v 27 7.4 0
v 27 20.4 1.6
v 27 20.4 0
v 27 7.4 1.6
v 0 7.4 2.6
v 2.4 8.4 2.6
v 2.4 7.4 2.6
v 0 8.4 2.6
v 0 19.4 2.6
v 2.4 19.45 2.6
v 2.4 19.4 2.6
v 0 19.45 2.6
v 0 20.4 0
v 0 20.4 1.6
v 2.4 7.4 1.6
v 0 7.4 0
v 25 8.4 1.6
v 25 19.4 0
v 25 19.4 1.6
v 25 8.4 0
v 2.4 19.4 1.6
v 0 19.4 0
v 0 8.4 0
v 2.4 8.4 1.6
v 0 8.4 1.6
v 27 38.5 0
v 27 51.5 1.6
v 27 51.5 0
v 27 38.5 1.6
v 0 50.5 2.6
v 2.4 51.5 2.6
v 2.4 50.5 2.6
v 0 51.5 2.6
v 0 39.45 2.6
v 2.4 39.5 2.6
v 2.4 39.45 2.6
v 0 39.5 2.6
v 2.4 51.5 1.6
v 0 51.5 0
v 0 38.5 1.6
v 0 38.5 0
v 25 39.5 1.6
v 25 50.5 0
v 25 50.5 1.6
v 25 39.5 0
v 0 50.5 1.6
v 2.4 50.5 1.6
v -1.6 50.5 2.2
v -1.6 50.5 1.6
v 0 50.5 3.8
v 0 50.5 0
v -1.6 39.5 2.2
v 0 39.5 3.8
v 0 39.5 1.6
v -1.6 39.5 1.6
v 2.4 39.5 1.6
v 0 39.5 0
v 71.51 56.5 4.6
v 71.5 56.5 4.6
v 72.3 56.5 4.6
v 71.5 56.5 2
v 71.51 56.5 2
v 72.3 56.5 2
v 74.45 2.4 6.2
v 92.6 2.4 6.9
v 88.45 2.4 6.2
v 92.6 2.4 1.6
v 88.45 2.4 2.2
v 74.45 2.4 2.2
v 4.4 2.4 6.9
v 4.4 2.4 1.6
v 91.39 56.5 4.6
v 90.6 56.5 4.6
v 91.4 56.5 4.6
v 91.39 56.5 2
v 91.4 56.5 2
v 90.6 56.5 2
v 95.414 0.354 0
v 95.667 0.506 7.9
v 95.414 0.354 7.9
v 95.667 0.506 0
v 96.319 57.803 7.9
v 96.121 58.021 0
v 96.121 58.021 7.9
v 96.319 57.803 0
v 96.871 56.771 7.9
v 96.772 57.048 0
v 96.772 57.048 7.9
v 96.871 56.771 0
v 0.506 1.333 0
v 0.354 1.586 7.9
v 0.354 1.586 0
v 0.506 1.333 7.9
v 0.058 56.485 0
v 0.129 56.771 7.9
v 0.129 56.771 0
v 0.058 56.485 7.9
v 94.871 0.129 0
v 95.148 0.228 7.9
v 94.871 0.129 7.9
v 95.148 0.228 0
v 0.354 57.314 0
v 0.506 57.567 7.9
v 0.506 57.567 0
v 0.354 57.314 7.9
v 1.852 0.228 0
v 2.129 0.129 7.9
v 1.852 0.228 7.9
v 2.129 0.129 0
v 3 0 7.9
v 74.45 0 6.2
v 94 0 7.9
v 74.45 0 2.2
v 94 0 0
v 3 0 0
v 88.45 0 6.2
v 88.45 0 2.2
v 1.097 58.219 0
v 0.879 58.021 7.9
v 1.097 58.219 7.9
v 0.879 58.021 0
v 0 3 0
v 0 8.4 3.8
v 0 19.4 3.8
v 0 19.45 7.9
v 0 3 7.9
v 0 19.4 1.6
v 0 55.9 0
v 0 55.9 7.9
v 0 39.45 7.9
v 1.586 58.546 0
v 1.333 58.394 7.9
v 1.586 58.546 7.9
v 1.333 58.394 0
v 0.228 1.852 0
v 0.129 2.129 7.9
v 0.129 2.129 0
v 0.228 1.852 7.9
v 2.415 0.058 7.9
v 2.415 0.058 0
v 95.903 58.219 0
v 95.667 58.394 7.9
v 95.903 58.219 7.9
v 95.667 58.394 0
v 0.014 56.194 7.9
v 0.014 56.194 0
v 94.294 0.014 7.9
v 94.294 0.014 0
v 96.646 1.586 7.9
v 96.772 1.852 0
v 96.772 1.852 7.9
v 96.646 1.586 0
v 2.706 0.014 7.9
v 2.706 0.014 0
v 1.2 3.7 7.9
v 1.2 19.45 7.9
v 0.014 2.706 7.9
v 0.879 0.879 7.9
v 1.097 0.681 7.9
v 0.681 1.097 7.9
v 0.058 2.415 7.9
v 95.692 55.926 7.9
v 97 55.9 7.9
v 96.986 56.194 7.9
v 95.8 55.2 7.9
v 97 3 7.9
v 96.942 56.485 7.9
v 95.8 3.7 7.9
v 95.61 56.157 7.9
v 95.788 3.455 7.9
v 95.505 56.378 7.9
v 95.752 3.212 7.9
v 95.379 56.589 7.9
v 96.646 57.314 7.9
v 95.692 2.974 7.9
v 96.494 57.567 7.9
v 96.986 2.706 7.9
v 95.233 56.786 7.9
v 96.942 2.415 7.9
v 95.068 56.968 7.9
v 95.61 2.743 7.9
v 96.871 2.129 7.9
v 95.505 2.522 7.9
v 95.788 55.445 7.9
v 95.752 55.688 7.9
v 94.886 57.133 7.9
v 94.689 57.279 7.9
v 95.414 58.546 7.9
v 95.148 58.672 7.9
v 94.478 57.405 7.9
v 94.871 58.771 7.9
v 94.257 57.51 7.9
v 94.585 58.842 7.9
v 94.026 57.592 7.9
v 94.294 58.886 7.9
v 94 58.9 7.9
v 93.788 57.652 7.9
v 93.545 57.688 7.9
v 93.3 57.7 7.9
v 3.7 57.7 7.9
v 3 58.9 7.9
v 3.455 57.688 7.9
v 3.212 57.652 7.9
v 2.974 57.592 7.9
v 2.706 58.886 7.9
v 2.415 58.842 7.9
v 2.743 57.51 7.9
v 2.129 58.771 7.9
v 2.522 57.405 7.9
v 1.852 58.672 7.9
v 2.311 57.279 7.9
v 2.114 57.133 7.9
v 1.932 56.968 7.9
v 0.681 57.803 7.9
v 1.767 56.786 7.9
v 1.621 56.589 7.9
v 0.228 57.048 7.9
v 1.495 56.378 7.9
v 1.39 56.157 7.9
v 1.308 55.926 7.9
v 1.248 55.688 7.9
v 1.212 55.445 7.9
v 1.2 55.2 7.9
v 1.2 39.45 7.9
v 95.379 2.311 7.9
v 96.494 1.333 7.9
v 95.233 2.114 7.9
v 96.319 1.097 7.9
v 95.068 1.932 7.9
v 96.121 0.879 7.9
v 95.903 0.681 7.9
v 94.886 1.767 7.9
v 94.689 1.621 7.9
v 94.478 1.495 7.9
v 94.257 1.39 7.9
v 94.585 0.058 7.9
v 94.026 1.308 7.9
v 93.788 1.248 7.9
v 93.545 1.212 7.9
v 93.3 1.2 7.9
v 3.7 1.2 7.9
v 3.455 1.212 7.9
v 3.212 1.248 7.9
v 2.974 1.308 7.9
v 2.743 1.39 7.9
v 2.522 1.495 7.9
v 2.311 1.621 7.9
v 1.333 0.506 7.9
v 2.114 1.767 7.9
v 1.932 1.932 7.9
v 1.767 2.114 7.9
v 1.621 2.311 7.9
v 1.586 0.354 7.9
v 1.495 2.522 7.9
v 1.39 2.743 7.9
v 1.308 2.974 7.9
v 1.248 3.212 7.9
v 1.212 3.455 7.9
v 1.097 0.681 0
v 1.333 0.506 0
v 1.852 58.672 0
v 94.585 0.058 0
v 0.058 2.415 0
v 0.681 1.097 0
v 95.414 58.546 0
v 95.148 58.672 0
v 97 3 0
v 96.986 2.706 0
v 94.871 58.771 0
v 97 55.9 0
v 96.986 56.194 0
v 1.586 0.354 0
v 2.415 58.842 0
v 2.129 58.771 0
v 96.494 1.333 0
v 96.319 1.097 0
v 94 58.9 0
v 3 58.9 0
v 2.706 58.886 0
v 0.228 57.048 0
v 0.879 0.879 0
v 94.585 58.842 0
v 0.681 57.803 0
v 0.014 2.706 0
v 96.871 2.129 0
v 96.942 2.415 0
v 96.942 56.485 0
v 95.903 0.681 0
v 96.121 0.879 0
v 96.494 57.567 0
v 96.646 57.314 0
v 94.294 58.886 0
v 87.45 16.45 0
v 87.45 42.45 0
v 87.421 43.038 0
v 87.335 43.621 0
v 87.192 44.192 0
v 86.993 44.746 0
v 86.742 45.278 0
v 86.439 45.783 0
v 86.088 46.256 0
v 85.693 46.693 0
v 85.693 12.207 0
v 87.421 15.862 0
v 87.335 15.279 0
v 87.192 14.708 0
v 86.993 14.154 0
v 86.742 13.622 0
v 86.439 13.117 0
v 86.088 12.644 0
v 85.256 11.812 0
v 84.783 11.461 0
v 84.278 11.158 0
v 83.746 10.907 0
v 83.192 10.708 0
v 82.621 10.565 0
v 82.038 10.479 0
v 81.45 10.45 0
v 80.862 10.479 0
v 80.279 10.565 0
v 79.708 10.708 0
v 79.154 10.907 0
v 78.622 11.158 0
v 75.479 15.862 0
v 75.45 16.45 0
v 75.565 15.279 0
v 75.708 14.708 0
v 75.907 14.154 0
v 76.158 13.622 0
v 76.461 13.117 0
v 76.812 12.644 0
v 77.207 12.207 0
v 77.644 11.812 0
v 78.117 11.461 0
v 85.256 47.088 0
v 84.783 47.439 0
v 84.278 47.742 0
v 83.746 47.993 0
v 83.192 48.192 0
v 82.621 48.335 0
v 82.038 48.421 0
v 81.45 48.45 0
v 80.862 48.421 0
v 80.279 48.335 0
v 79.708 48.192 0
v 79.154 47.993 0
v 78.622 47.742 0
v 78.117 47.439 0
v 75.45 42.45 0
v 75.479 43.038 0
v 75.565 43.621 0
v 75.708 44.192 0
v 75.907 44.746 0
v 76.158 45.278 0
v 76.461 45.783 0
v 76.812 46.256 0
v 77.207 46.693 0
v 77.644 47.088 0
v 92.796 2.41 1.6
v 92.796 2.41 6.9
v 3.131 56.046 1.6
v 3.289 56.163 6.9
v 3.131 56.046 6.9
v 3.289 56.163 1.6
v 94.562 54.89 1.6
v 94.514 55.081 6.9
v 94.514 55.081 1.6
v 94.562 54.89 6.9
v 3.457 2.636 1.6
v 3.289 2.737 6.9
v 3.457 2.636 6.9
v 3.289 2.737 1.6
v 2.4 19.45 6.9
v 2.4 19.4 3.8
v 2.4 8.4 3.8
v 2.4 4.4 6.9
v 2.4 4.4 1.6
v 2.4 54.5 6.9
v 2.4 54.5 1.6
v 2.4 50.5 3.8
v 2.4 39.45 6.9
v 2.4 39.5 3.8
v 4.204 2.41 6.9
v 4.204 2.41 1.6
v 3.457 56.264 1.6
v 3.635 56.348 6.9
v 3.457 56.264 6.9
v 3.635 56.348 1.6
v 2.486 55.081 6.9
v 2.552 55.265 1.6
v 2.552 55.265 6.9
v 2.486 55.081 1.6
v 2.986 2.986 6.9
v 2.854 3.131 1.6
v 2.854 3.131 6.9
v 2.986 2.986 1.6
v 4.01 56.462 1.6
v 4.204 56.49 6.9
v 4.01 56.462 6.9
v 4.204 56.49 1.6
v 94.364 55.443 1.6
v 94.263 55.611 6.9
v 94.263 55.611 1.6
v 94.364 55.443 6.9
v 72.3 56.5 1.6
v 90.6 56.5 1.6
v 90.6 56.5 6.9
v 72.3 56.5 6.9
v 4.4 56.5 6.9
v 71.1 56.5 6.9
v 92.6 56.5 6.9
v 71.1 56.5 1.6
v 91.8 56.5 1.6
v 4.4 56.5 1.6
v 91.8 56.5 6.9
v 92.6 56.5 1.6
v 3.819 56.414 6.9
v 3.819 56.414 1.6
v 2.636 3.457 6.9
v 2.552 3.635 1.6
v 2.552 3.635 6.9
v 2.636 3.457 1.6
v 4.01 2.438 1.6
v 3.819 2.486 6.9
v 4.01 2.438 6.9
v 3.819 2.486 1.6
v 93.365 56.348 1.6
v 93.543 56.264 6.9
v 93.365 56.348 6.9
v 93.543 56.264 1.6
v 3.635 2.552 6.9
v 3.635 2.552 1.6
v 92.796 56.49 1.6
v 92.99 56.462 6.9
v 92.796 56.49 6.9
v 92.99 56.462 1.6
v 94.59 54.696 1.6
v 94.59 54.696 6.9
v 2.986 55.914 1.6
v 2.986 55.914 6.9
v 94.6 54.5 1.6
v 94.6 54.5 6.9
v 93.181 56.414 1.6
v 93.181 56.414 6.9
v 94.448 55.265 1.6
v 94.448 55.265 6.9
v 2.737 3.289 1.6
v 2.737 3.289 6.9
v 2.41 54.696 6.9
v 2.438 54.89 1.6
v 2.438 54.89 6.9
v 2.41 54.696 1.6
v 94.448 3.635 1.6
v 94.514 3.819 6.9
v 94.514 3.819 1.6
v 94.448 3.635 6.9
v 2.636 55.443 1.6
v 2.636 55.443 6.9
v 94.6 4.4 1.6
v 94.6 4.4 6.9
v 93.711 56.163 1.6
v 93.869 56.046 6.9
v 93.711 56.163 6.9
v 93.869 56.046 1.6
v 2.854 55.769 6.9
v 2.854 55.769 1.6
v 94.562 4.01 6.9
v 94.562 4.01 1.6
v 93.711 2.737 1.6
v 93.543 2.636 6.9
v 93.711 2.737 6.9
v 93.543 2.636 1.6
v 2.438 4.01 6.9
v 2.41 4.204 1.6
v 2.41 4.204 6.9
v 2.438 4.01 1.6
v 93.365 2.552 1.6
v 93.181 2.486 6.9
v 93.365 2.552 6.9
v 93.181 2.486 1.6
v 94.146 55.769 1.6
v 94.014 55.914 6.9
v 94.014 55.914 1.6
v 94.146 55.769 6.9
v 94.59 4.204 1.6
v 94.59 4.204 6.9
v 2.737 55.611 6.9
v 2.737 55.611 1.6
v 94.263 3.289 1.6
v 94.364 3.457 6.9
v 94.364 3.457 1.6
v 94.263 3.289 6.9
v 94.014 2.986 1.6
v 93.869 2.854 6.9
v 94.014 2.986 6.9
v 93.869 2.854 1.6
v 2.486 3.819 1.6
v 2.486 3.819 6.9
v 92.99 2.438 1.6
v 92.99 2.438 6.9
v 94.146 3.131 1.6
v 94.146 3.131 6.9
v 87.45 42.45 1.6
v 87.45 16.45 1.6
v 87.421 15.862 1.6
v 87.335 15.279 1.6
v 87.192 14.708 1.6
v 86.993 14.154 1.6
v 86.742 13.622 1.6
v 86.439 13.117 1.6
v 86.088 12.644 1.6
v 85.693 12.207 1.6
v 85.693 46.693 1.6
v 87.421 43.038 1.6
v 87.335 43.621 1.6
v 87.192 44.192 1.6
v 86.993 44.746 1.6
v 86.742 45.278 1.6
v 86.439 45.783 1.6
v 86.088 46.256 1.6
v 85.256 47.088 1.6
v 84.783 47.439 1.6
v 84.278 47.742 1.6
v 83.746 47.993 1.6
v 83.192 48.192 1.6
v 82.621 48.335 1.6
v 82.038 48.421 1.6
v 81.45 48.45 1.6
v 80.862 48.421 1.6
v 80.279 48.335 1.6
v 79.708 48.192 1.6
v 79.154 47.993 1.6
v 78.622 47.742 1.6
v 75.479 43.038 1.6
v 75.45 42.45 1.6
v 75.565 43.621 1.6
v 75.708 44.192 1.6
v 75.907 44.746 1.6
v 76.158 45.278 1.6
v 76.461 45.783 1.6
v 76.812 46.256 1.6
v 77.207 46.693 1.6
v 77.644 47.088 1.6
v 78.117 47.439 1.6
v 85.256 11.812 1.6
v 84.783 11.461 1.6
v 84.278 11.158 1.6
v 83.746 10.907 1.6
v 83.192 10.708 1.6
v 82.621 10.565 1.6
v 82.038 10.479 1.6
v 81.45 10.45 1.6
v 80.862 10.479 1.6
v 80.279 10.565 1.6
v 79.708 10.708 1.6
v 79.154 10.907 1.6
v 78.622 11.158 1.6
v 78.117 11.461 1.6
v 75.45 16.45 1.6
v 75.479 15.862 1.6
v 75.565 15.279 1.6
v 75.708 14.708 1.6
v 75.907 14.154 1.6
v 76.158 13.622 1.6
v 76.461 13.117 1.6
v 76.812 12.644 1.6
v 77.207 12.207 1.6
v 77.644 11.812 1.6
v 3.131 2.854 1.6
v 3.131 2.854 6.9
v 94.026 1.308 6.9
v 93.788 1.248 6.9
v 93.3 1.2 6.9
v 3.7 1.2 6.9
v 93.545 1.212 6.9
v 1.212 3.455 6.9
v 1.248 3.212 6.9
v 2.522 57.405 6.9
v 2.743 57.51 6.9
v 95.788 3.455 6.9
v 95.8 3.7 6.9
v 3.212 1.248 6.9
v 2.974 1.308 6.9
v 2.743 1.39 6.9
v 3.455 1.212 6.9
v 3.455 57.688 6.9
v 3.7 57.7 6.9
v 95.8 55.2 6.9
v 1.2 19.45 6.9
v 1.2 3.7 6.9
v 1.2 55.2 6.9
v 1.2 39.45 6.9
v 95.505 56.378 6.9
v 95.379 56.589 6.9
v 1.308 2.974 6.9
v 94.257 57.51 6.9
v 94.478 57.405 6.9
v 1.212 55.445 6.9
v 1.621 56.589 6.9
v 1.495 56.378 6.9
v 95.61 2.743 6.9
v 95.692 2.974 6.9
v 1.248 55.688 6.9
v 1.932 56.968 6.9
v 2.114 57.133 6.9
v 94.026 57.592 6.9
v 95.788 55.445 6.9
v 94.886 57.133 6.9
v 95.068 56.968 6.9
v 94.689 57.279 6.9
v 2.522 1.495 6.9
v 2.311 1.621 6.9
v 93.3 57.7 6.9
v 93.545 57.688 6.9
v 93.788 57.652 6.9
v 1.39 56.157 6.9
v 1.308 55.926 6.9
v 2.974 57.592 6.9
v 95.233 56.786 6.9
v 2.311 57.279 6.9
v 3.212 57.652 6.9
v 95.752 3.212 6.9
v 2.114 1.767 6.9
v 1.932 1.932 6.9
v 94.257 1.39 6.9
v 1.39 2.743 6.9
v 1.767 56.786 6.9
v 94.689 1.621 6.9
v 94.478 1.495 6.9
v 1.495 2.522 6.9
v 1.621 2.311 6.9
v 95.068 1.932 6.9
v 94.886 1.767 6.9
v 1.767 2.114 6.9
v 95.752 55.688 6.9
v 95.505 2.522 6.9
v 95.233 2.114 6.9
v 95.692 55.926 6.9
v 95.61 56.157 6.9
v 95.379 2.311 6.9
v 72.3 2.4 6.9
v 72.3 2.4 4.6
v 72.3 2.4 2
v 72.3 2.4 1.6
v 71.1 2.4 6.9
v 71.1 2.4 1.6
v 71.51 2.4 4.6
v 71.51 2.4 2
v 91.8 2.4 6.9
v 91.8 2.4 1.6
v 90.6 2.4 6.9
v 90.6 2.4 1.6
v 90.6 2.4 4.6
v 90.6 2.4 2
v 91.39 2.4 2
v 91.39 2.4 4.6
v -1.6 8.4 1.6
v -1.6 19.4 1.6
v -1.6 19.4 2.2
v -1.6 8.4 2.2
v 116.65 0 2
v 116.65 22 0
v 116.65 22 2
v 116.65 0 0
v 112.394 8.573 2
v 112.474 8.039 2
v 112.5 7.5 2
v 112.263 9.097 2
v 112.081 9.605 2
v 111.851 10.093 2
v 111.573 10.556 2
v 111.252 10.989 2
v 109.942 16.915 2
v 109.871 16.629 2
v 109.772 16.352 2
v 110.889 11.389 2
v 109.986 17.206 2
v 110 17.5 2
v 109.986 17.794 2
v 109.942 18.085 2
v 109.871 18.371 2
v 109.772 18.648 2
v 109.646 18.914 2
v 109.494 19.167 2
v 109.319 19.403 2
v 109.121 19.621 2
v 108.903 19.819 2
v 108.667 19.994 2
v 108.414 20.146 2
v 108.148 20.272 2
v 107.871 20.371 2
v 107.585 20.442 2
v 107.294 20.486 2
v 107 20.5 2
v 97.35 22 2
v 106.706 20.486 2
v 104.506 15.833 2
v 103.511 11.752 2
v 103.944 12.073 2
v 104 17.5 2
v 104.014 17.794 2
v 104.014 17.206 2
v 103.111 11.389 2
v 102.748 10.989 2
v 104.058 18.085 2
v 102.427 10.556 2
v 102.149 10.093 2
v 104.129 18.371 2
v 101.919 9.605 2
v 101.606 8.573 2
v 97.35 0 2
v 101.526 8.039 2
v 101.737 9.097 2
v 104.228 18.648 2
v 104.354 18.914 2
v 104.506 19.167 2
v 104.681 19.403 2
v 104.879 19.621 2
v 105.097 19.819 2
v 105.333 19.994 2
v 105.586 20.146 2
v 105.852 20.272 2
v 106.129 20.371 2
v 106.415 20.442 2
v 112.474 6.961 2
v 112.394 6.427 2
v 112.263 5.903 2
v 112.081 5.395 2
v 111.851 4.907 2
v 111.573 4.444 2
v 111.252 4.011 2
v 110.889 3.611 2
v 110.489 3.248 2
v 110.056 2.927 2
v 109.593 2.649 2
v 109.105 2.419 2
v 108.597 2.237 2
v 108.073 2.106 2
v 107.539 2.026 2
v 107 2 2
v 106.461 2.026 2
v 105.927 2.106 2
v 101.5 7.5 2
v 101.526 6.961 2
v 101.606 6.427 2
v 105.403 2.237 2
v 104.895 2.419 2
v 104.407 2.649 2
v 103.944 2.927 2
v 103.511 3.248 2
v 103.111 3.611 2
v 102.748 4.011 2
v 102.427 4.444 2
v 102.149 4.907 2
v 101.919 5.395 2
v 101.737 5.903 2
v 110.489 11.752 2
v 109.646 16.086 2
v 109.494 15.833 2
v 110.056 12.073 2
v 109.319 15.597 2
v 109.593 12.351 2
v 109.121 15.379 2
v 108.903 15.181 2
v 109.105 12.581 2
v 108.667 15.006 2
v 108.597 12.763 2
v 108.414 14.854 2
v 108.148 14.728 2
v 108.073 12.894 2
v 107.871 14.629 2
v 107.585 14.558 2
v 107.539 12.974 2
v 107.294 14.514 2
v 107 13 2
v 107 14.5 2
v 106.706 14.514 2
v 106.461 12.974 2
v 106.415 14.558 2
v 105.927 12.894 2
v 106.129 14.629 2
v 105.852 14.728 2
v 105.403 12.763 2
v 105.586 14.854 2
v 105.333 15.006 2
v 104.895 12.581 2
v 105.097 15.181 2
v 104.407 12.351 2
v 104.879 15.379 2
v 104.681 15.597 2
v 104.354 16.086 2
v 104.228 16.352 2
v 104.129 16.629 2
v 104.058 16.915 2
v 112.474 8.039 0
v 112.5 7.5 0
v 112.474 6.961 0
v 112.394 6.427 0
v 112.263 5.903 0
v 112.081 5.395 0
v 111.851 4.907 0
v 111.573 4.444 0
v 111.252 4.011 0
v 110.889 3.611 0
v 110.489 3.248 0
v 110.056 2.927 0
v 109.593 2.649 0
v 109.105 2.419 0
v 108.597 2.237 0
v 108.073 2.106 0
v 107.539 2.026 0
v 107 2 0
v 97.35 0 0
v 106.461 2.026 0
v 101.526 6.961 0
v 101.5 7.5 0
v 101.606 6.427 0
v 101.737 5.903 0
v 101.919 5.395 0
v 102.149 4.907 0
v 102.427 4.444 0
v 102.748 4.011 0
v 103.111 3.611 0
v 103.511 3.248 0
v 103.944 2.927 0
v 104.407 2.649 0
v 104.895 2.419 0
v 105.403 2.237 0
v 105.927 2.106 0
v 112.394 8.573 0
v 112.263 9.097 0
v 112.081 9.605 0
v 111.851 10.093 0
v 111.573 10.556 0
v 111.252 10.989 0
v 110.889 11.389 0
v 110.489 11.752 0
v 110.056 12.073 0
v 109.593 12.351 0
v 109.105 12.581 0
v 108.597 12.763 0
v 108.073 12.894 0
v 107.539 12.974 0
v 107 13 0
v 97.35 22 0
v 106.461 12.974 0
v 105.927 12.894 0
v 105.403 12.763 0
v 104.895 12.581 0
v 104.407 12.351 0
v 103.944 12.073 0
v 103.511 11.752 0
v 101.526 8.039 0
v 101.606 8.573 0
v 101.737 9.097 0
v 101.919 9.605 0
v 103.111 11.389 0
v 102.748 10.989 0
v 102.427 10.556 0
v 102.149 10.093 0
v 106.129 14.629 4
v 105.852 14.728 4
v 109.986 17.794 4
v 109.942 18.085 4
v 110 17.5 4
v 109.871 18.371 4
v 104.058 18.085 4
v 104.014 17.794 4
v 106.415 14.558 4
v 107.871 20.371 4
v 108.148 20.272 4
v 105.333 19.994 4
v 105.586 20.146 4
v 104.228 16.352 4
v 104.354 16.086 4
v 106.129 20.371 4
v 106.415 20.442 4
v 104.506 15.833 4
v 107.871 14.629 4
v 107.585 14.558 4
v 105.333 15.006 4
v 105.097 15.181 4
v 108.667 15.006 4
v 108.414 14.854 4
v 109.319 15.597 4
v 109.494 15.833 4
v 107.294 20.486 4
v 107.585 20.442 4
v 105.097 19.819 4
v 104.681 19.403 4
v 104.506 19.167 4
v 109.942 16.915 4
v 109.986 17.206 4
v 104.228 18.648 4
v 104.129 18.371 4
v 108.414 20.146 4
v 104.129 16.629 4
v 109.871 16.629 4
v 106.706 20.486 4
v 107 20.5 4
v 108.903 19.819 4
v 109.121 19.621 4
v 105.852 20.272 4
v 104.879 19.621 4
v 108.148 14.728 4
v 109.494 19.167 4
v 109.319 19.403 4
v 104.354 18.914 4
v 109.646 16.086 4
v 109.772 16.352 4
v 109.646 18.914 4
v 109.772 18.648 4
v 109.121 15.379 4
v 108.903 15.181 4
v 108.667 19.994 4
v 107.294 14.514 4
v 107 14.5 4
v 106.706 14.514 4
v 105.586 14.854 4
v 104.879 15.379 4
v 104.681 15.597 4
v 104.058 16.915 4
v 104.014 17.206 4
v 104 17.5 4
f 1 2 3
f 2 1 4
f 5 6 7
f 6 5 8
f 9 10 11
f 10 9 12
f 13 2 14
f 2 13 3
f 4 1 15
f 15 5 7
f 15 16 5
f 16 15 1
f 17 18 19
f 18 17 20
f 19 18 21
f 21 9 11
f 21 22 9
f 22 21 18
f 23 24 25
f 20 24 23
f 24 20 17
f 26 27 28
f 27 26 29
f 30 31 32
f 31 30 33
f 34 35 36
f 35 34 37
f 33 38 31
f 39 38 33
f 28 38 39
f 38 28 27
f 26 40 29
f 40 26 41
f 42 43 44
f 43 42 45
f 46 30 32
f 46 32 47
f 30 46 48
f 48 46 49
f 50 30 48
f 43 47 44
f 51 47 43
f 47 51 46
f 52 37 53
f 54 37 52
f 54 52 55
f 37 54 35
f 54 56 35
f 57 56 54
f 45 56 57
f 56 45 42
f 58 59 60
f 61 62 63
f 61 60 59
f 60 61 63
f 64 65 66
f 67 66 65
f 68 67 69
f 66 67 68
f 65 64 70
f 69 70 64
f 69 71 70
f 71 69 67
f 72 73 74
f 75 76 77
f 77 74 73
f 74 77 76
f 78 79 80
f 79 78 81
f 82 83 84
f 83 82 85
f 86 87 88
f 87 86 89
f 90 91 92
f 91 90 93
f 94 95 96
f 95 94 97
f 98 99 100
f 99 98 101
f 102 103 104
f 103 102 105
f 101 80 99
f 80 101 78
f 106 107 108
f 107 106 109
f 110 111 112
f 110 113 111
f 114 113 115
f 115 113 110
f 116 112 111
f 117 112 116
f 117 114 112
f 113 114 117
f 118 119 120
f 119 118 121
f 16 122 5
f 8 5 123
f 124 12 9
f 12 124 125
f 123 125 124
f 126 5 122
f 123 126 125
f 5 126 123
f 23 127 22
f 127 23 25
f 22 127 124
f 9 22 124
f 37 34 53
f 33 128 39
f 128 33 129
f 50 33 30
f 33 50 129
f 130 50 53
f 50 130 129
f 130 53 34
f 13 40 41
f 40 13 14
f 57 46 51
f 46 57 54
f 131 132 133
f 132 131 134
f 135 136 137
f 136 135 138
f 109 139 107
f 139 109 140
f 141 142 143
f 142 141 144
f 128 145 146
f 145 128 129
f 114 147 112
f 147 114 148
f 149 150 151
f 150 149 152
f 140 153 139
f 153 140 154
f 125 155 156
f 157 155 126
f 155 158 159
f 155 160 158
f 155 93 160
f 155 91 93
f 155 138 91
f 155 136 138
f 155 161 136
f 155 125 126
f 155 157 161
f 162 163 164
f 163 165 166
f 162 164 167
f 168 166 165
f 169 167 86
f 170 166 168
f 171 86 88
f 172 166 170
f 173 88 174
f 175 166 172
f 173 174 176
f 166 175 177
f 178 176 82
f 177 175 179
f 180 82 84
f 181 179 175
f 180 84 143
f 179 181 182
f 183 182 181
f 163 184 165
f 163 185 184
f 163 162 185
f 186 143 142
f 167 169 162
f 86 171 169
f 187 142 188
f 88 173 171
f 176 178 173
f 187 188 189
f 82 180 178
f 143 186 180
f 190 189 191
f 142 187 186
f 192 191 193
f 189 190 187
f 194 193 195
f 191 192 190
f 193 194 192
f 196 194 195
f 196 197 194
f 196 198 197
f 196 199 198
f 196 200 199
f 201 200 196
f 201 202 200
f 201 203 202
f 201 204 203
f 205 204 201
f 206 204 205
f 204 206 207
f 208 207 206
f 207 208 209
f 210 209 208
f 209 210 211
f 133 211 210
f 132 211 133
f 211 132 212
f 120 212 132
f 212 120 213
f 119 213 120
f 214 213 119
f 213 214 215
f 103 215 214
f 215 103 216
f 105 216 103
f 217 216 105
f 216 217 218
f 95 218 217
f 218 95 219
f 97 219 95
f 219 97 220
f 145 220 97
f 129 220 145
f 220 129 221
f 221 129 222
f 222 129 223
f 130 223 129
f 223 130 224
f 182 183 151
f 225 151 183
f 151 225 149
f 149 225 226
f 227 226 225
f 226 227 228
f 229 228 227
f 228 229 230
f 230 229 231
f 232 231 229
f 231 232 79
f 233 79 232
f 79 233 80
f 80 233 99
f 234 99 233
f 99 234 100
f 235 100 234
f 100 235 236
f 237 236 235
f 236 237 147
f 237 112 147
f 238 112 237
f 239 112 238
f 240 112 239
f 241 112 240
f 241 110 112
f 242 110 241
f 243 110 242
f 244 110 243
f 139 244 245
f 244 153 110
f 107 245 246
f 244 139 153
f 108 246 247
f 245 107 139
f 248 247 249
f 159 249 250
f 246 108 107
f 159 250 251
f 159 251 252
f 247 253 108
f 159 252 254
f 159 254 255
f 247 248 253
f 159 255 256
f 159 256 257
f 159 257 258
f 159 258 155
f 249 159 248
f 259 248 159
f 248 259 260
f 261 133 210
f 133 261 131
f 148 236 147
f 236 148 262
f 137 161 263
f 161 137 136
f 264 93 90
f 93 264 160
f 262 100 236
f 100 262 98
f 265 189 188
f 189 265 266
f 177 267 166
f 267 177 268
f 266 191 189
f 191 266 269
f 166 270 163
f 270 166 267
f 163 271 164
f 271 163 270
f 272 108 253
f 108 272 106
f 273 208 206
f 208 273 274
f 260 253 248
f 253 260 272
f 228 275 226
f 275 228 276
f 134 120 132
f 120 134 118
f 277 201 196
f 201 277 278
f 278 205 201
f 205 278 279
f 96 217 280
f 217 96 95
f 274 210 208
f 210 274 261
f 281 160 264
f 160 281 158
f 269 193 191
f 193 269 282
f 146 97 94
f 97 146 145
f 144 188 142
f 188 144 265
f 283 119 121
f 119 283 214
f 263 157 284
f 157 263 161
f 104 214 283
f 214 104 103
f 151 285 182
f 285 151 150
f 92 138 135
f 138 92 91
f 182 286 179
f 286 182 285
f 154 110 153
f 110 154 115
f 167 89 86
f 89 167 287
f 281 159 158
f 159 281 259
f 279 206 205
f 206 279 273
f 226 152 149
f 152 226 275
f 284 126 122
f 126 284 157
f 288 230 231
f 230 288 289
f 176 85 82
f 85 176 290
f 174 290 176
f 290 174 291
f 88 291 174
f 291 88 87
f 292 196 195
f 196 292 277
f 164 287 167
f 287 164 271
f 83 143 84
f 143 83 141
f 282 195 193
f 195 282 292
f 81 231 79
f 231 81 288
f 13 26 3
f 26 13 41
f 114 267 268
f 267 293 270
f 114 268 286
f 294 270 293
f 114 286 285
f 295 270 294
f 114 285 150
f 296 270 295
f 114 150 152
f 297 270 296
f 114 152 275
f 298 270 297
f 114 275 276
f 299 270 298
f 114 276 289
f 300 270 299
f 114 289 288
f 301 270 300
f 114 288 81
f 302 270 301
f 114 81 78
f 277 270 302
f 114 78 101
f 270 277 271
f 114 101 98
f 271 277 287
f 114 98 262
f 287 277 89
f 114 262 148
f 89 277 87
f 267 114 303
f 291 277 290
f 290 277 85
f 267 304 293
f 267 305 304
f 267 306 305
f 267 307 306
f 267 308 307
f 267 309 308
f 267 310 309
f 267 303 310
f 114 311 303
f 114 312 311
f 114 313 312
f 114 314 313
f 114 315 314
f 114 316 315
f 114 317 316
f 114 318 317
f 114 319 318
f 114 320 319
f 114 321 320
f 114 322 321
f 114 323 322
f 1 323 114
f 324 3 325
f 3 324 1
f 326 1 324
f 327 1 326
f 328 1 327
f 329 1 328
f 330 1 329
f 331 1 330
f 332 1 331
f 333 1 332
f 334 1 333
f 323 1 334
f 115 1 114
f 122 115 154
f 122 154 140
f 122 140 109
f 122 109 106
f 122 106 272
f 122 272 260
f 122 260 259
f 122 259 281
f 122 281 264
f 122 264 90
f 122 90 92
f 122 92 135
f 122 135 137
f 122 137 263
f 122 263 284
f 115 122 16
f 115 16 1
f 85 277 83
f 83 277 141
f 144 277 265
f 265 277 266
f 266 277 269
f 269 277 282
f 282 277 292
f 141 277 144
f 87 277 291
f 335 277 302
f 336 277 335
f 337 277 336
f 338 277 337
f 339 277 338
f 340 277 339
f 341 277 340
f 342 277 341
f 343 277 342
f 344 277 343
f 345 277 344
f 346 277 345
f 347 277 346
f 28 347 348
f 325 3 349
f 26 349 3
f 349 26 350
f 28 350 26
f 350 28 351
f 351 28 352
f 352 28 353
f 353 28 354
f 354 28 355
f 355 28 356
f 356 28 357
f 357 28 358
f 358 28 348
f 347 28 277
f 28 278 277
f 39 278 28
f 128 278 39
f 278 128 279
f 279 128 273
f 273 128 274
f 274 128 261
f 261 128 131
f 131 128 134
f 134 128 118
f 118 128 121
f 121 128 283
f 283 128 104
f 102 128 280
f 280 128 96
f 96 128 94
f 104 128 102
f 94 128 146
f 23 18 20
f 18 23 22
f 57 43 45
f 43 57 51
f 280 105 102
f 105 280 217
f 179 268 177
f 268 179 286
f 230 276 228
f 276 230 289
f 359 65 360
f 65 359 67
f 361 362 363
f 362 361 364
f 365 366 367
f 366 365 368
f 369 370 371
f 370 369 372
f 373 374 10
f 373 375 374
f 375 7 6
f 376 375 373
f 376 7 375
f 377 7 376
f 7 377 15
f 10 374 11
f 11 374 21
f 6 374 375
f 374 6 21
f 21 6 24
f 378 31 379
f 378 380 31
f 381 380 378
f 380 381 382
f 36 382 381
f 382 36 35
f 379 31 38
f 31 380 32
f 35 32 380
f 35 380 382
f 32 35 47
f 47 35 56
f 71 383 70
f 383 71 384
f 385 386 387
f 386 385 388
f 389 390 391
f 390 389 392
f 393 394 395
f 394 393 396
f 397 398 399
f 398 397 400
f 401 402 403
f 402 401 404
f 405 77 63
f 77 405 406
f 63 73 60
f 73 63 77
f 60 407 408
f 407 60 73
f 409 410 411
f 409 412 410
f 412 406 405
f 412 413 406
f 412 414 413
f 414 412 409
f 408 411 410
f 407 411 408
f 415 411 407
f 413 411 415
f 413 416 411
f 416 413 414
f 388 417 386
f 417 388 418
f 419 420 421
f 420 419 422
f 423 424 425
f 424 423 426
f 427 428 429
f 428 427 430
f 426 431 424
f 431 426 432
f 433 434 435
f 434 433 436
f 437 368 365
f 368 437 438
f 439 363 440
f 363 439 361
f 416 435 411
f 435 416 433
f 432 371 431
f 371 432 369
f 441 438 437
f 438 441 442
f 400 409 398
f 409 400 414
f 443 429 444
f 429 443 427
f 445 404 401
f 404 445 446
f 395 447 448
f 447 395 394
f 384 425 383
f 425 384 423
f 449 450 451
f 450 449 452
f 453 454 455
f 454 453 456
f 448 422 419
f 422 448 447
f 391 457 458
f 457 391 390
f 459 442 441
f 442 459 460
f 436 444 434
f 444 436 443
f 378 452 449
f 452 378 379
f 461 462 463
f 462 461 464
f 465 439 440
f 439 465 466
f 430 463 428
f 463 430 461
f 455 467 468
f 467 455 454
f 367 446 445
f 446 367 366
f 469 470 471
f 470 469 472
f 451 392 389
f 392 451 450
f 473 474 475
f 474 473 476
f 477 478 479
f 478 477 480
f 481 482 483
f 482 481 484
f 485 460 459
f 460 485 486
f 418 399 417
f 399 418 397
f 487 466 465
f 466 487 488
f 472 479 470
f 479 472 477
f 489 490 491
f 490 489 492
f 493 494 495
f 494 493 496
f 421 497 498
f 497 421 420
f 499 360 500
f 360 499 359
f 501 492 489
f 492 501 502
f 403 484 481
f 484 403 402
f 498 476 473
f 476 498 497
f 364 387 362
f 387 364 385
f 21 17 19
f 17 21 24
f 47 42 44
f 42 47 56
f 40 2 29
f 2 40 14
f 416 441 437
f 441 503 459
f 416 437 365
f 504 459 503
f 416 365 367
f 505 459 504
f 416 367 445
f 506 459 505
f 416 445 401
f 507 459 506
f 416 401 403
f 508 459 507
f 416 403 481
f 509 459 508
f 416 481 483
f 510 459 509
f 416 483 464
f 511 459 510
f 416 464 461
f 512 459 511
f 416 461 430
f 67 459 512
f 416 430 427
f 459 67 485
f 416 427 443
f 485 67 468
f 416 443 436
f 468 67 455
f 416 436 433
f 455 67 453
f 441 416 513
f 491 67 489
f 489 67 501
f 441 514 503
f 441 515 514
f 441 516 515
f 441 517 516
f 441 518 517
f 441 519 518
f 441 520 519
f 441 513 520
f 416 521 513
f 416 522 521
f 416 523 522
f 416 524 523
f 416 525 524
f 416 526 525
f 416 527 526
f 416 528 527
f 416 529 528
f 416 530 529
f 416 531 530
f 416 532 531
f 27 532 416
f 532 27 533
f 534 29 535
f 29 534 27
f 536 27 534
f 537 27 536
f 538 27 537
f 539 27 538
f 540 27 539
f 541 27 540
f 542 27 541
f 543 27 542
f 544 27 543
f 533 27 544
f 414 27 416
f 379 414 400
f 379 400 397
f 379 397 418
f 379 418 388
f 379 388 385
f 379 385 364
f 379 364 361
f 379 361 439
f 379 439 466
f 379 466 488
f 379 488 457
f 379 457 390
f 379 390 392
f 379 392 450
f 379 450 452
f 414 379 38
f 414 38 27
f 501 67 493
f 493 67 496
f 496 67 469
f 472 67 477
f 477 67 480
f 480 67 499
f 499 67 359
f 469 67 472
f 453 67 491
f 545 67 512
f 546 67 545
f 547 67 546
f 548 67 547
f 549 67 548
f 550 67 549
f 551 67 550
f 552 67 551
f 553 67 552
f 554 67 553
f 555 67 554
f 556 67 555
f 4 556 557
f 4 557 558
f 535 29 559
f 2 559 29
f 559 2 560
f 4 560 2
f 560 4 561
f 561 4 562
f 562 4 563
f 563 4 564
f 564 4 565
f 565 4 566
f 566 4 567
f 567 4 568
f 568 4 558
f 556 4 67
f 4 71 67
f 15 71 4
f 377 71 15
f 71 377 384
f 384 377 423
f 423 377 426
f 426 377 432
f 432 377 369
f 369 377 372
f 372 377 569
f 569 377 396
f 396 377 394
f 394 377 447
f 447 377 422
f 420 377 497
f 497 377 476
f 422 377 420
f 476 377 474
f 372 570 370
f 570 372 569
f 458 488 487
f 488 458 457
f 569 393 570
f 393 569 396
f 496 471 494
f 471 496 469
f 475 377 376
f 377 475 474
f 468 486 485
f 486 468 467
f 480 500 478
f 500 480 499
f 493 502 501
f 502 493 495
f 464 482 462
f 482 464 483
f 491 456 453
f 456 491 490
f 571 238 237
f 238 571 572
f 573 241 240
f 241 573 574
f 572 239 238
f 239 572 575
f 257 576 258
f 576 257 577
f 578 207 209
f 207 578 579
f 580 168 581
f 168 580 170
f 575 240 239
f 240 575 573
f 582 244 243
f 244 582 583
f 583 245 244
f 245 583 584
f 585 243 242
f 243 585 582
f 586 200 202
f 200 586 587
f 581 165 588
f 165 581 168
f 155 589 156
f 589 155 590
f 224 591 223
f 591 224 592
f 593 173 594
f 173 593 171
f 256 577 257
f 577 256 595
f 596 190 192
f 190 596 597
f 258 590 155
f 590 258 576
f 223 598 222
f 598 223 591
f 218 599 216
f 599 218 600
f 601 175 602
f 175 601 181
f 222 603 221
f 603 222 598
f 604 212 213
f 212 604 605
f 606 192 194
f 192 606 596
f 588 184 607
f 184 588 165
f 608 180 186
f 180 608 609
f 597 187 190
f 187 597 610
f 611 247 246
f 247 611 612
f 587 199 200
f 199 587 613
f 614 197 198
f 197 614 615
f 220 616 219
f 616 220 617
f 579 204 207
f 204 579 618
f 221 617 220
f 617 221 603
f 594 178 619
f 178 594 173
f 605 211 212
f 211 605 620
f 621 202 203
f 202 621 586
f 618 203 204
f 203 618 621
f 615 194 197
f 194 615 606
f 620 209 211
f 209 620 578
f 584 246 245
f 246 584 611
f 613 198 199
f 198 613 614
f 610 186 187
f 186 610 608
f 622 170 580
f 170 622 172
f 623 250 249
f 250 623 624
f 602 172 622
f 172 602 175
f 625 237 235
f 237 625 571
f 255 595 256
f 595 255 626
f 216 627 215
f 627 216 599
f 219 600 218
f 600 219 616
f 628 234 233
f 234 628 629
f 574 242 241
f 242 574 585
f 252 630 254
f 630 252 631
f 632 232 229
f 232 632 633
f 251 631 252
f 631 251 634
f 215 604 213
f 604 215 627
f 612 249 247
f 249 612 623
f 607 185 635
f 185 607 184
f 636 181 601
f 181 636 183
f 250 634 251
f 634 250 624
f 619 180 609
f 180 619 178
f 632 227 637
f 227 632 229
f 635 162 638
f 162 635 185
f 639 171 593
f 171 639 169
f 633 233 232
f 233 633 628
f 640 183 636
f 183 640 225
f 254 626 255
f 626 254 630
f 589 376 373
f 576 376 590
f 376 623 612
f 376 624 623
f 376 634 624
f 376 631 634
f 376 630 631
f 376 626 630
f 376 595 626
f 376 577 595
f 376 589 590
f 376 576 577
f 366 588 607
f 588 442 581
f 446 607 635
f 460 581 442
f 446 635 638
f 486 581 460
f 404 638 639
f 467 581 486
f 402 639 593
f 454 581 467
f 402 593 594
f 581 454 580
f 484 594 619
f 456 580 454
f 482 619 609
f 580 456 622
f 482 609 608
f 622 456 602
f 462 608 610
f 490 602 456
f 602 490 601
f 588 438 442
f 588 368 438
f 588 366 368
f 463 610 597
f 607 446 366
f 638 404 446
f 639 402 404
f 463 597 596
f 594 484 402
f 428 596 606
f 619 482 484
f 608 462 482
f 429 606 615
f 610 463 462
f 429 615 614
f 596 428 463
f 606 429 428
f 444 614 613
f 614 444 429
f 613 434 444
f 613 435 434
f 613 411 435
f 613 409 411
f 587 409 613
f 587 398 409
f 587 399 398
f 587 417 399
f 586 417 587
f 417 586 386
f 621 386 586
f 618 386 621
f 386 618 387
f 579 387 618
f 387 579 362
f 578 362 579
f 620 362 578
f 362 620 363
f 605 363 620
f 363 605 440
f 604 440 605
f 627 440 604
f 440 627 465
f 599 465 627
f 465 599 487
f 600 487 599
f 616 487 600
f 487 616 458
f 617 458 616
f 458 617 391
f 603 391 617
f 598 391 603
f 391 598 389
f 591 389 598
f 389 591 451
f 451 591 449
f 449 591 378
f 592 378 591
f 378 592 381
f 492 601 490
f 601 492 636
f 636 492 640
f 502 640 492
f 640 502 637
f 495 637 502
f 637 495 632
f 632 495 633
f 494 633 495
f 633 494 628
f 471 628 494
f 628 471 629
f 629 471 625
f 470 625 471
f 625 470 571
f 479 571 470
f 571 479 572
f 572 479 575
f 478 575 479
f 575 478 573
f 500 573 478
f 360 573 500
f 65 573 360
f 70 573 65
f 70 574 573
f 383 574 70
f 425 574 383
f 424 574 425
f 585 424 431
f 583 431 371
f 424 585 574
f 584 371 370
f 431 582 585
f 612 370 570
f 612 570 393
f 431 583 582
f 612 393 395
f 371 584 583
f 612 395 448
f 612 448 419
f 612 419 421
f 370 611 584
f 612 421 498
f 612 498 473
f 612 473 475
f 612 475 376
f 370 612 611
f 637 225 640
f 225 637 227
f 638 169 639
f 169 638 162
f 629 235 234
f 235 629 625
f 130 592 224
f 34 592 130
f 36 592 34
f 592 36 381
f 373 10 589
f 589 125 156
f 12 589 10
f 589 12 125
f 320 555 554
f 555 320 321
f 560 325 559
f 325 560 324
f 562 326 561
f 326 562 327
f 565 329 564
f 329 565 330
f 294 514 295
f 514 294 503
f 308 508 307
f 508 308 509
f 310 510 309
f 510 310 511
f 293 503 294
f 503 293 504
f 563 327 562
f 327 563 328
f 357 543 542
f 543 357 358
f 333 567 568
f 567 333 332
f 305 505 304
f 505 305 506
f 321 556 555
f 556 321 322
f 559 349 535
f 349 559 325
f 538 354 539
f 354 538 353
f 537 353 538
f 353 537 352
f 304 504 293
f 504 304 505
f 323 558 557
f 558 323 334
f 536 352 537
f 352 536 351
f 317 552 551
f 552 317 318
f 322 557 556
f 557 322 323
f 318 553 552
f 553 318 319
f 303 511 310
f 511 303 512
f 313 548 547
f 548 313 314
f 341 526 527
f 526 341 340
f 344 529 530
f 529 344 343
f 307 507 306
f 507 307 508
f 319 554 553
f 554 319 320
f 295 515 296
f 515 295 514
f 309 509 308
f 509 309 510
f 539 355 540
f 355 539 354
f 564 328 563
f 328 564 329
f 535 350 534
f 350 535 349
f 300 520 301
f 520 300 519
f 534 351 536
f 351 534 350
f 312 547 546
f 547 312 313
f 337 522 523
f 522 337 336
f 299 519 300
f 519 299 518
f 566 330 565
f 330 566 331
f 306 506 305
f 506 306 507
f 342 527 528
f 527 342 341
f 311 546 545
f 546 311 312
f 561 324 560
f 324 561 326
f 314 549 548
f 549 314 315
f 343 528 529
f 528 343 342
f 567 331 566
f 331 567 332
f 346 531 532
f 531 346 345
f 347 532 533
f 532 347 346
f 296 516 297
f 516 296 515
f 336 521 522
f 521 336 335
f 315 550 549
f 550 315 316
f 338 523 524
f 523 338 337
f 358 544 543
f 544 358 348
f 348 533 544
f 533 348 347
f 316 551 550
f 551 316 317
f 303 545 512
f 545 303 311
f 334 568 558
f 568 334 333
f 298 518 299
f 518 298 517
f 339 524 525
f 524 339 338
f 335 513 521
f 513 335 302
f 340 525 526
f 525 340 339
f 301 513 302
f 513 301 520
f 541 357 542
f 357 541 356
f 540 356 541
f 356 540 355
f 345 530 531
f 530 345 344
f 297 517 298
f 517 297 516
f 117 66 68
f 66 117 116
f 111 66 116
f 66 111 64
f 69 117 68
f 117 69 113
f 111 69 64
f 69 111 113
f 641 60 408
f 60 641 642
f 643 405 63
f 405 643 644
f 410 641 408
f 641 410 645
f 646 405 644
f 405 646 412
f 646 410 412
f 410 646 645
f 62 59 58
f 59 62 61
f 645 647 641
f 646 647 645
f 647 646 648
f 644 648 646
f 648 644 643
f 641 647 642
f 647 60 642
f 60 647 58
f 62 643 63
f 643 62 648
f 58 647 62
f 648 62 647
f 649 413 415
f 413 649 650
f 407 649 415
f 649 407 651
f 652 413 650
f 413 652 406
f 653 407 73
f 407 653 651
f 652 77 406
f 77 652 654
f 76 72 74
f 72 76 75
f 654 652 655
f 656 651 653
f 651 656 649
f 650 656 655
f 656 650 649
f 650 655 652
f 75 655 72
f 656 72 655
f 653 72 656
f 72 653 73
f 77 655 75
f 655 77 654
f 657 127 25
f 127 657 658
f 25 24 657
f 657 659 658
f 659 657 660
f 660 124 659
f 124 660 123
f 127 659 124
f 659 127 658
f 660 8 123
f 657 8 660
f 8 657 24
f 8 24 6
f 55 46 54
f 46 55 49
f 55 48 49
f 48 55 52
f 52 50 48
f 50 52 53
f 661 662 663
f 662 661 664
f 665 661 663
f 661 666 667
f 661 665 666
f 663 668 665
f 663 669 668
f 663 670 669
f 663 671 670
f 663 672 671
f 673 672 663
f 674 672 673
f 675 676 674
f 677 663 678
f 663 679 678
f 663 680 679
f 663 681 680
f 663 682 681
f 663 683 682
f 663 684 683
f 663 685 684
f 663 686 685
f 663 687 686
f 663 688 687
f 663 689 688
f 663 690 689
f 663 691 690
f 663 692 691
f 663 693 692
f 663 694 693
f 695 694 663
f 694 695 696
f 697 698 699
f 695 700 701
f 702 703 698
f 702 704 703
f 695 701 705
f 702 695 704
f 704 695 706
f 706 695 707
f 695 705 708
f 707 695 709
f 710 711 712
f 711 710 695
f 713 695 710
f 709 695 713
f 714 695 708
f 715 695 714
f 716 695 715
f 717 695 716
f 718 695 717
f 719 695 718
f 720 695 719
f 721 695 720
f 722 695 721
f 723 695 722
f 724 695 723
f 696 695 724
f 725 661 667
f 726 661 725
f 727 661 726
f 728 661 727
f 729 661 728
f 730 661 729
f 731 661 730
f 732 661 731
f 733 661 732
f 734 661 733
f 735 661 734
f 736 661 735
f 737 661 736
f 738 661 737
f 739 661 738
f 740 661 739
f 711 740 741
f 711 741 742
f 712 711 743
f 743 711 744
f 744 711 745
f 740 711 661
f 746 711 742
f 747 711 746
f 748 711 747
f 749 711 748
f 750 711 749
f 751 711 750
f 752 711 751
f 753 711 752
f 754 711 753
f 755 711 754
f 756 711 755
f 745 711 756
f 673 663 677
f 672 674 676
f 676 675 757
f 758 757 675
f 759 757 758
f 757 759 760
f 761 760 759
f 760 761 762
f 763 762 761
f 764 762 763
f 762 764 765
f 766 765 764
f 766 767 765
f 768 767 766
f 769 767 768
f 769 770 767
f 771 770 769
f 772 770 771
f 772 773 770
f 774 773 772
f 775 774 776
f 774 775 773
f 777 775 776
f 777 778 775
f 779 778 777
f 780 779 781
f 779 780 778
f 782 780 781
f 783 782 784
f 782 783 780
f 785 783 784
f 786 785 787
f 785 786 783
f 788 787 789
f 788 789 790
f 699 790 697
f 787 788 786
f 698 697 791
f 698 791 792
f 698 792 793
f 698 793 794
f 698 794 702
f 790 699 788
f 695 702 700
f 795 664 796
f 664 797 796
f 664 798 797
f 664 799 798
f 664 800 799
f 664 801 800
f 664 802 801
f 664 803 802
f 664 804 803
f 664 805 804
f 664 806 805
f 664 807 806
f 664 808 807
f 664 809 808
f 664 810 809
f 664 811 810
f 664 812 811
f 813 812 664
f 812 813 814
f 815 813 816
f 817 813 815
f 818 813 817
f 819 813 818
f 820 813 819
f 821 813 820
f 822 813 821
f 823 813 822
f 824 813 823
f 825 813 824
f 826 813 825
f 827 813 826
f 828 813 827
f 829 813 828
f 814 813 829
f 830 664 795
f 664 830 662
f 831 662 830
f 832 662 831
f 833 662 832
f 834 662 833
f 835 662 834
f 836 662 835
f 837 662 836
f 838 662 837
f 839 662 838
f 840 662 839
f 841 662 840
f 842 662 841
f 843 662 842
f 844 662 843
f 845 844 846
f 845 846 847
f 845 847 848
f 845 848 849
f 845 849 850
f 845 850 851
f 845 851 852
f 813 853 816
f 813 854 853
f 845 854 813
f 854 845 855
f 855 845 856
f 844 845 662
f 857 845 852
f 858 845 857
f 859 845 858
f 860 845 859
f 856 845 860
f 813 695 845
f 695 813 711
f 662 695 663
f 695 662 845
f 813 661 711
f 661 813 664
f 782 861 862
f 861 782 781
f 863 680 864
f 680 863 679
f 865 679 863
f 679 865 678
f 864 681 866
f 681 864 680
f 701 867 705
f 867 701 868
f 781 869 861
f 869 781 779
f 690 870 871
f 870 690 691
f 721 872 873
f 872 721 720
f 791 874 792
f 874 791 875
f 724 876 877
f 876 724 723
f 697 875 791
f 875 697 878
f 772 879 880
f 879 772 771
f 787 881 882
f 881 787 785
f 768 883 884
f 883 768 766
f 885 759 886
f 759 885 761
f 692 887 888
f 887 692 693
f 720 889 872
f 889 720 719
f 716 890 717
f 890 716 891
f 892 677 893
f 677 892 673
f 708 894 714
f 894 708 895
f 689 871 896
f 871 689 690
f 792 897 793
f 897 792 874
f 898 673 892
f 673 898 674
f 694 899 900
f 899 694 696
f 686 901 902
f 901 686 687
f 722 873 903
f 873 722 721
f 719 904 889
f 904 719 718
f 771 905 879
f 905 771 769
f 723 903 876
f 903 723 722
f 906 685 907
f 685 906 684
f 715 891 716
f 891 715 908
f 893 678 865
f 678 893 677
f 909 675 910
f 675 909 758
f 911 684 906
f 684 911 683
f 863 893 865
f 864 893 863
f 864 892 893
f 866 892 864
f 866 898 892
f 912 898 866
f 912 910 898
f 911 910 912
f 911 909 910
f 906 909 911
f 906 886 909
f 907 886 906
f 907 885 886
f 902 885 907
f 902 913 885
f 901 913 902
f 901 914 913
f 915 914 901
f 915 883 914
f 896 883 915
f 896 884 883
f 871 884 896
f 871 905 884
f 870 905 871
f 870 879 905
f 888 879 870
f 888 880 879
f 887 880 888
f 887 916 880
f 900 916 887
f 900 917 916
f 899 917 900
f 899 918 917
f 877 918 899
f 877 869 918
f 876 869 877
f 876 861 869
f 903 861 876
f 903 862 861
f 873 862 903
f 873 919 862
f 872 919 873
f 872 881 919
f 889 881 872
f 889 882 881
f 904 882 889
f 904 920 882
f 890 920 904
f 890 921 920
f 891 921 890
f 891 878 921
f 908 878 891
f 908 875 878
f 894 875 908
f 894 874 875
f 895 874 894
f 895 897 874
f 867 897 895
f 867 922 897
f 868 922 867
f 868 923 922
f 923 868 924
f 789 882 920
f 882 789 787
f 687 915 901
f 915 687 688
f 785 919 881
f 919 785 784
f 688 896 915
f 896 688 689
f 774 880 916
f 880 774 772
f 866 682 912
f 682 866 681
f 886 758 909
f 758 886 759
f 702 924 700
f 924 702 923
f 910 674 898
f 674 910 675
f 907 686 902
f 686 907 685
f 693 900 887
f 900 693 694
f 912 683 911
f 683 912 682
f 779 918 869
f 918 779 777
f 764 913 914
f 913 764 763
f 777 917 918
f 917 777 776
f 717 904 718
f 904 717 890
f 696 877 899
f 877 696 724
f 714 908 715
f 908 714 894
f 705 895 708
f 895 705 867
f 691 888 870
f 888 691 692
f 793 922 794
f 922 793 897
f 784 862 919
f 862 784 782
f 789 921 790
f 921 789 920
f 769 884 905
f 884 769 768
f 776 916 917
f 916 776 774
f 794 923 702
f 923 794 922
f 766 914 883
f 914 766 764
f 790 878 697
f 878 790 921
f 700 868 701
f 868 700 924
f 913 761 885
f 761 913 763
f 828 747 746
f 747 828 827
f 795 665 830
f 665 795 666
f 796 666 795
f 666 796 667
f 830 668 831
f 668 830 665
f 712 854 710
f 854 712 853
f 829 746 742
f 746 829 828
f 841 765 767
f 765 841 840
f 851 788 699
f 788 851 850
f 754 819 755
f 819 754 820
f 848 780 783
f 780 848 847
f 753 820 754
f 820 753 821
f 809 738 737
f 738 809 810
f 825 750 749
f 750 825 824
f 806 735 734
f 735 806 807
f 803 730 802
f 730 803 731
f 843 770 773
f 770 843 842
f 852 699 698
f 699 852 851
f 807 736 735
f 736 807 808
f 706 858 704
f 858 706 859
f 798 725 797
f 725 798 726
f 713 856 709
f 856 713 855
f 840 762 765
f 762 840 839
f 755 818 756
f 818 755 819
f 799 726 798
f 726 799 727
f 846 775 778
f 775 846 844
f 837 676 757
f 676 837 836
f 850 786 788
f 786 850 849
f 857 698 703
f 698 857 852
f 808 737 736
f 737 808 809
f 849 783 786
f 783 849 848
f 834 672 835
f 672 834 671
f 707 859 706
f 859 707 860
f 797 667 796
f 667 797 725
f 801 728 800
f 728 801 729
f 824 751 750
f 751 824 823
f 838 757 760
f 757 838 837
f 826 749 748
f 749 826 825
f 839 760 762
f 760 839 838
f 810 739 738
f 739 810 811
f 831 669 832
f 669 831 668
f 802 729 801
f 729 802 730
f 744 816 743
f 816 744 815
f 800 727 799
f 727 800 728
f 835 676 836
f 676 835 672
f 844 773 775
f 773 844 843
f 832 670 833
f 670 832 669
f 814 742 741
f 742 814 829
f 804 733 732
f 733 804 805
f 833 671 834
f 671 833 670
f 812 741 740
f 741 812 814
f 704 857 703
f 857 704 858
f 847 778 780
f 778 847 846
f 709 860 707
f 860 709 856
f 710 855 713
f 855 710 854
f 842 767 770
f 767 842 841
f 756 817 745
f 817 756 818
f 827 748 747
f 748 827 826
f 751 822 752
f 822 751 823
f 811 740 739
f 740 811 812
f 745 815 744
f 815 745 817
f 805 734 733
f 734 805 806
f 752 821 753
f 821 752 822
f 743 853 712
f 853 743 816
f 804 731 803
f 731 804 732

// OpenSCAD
// Recreated clip-in tray with cross slider
// Dimensions from caliper photos (inches -> mm):
//   overall length 3.82 in = 97.0   | width 2.32 in = 58.9
//   thickness      0.31 in =  7.9   | slider channel 0.72 in = 18.3
//   pocket length  3.63 in = 92.2 (approx, inner)
// Everything else is estimated from the photos - tweak below.

/* [Render] */
part = "all";          // [all, base, slider]

/* [Body] */
L        = 97.0;
W        = 58.9;
H        = 7.9;
corner_r = 3.0;
floor_t  = 1.6;
wall_t   = 2.4;
rim_w    = 1.2;   // stepped inner rim at the top edge
rim_d    = 1.0;

/* [Clip end (x = 0)] */
finger_w     = 11.0;
finger_len   = 26.0;
finger_gap   = 1.0;   // slot width around each finger
finger_inset = 6.0;   // distance from side wall to finger
hook_out     = 1.6;   // how far the hook sticks out past the end
hook_h       = 2.2;
end_gap_w    = 20.0;  // open notch in the end wall between fingers

/* [Slider channel (near x = L)] */
ch_w        = 18.3;   // measured
ch_x        = L - wall_t - 4.0 - ch_w/2;   // channel centre line
ch_wall     = 1.2;
groove_d    = 0.8;    // retention groove the slider rides in
slot_w      = 12.0;   // stadium window through the floor
slot_len    = 38.0;
side_win_h  = 4.0;    // window in the side wall the slider pokes out of
side_win_w  = 14.0;

/* [Slider] */
clr        = 0.3;     // fit clearance per side
sl_len     = 22.0;
sl_t       = 2.0;
hole_d     = 11.0;    // round hole / magnet seat
knob_d     = 6.0;
knob_h     = 2.0;

$fn = 64;

module rrect(x, y, h, r) {
    linear_extrude(h)
        offset(r) offset(-r) square([x, y]);
}

module stadium(len, w, h) {
    hull() {
        translate([0, w/2, 0])       cylinder(d = w, h = h);
        translate([0, len - w/2, 0]) cylinder(d = w, h = h);
    }
}

module base() {
    difference() {
        rrect(L, W, H, corner_r);

        // main pocket
        translate([wall_t, wall_t, floor_t])
            rrect(L - 2*wall_t, W - 2*wall_t, H, corner_r - 1);

        // stepped top rim
        translate([wall_t - rim_w, wall_t - rim_w, H - rim_d])
            rrect(L - 2*(wall_t - rim_w), W - 2*(wall_t - rim_w), H, corner_r - 0.5);

        // finger slots (U-cut around each finger)
        for (y0 = [finger_inset + wall_t, W - wall_t - finger_inset - finger_w])
            translate([-1, y0 - finger_gap, -1])
                difference() {
                    cube([finger_len + finger_gap + 1, finger_w + 2*finger_gap, floor_t + 2]);
                    translate([-1, finger_gap, -1])
                        cube([finger_len + 1, finger_w, floor_t + 4]);
                }

        // notch in end wall between fingers
        translate([-1, (W - end_gap_w)/2, floor_t])
            cube([wall_t + 2, end_gap_w, H]);

        // floor stadium window under the slider
        translate([ch_x, (W - slot_len)/2, -1])
            stadium(slot_len, slot_w, floor_t + 2);

        // side-wall window where the slider exits
        translate([ch_x - side_win_w/2, -1, floor_t + 0.6])
            cube([side_win_w, wall_t + 2, side_win_h]);

        // retention grooves inside the channel walls
        for (s = [-1, 1])
            translate([ch_x + s*(ch_w/2) - (s > 0 ? 0 : groove_d), wall_t, floor_t + 0.4])
                cube([groove_d, W - 2*wall_t, sl_t + 2*clr]);
    }

    // channel side walls
    for (s = [-1, 1])
        translate([ch_x + s*(ch_w/2) + (s > 0 ? 0 : -ch_wall), wall_t, floor_t])
            difference() {
                cube([ch_wall, W - 2*wall_t, H - floor_t - rim_d]);
                translate([s > 0 ? -0.01 : ch_wall - groove_d + 0.01, -1, 0.4])
                    cube([groove_d, W, sl_t + 2*clr]);
            }

    // hooks on the finger tips
    for (y0 = [finger_inset + wall_t, W - wall_t - finger_inset - finger_w])
        translate([0, y0, 0])
            hull() {
                translate([-hook_out, 0, floor_t]) cube([0.01, finger_w, 0.6]);
                translate([0, 0, floor_t]) cube([wall_t, finger_w, hook_h]);
            }
}

module slider() {
    w = ch_w + 2*groove_d - 2*clr;
    difference() {
        union() {
            translate([-w/2, 0, 0]) cube([w, sl_len, sl_t]);
            // thumb knob that pokes up for sliding
            translate([0, sl_len - knob_d/2 - 1.5, 0]) cylinder(d = knob_d, h = sl_t + knob_h);
        }
        translate([0, hole_d/2 + 2, -1]) cylinder(d = hole_d, h = sl_t + 2);
    }
}

if (part == "base" || part == "all") base();
if (part == "slider")                slider();
if (part == "all")
    translate([L + 10, 0, 0]) slider();
